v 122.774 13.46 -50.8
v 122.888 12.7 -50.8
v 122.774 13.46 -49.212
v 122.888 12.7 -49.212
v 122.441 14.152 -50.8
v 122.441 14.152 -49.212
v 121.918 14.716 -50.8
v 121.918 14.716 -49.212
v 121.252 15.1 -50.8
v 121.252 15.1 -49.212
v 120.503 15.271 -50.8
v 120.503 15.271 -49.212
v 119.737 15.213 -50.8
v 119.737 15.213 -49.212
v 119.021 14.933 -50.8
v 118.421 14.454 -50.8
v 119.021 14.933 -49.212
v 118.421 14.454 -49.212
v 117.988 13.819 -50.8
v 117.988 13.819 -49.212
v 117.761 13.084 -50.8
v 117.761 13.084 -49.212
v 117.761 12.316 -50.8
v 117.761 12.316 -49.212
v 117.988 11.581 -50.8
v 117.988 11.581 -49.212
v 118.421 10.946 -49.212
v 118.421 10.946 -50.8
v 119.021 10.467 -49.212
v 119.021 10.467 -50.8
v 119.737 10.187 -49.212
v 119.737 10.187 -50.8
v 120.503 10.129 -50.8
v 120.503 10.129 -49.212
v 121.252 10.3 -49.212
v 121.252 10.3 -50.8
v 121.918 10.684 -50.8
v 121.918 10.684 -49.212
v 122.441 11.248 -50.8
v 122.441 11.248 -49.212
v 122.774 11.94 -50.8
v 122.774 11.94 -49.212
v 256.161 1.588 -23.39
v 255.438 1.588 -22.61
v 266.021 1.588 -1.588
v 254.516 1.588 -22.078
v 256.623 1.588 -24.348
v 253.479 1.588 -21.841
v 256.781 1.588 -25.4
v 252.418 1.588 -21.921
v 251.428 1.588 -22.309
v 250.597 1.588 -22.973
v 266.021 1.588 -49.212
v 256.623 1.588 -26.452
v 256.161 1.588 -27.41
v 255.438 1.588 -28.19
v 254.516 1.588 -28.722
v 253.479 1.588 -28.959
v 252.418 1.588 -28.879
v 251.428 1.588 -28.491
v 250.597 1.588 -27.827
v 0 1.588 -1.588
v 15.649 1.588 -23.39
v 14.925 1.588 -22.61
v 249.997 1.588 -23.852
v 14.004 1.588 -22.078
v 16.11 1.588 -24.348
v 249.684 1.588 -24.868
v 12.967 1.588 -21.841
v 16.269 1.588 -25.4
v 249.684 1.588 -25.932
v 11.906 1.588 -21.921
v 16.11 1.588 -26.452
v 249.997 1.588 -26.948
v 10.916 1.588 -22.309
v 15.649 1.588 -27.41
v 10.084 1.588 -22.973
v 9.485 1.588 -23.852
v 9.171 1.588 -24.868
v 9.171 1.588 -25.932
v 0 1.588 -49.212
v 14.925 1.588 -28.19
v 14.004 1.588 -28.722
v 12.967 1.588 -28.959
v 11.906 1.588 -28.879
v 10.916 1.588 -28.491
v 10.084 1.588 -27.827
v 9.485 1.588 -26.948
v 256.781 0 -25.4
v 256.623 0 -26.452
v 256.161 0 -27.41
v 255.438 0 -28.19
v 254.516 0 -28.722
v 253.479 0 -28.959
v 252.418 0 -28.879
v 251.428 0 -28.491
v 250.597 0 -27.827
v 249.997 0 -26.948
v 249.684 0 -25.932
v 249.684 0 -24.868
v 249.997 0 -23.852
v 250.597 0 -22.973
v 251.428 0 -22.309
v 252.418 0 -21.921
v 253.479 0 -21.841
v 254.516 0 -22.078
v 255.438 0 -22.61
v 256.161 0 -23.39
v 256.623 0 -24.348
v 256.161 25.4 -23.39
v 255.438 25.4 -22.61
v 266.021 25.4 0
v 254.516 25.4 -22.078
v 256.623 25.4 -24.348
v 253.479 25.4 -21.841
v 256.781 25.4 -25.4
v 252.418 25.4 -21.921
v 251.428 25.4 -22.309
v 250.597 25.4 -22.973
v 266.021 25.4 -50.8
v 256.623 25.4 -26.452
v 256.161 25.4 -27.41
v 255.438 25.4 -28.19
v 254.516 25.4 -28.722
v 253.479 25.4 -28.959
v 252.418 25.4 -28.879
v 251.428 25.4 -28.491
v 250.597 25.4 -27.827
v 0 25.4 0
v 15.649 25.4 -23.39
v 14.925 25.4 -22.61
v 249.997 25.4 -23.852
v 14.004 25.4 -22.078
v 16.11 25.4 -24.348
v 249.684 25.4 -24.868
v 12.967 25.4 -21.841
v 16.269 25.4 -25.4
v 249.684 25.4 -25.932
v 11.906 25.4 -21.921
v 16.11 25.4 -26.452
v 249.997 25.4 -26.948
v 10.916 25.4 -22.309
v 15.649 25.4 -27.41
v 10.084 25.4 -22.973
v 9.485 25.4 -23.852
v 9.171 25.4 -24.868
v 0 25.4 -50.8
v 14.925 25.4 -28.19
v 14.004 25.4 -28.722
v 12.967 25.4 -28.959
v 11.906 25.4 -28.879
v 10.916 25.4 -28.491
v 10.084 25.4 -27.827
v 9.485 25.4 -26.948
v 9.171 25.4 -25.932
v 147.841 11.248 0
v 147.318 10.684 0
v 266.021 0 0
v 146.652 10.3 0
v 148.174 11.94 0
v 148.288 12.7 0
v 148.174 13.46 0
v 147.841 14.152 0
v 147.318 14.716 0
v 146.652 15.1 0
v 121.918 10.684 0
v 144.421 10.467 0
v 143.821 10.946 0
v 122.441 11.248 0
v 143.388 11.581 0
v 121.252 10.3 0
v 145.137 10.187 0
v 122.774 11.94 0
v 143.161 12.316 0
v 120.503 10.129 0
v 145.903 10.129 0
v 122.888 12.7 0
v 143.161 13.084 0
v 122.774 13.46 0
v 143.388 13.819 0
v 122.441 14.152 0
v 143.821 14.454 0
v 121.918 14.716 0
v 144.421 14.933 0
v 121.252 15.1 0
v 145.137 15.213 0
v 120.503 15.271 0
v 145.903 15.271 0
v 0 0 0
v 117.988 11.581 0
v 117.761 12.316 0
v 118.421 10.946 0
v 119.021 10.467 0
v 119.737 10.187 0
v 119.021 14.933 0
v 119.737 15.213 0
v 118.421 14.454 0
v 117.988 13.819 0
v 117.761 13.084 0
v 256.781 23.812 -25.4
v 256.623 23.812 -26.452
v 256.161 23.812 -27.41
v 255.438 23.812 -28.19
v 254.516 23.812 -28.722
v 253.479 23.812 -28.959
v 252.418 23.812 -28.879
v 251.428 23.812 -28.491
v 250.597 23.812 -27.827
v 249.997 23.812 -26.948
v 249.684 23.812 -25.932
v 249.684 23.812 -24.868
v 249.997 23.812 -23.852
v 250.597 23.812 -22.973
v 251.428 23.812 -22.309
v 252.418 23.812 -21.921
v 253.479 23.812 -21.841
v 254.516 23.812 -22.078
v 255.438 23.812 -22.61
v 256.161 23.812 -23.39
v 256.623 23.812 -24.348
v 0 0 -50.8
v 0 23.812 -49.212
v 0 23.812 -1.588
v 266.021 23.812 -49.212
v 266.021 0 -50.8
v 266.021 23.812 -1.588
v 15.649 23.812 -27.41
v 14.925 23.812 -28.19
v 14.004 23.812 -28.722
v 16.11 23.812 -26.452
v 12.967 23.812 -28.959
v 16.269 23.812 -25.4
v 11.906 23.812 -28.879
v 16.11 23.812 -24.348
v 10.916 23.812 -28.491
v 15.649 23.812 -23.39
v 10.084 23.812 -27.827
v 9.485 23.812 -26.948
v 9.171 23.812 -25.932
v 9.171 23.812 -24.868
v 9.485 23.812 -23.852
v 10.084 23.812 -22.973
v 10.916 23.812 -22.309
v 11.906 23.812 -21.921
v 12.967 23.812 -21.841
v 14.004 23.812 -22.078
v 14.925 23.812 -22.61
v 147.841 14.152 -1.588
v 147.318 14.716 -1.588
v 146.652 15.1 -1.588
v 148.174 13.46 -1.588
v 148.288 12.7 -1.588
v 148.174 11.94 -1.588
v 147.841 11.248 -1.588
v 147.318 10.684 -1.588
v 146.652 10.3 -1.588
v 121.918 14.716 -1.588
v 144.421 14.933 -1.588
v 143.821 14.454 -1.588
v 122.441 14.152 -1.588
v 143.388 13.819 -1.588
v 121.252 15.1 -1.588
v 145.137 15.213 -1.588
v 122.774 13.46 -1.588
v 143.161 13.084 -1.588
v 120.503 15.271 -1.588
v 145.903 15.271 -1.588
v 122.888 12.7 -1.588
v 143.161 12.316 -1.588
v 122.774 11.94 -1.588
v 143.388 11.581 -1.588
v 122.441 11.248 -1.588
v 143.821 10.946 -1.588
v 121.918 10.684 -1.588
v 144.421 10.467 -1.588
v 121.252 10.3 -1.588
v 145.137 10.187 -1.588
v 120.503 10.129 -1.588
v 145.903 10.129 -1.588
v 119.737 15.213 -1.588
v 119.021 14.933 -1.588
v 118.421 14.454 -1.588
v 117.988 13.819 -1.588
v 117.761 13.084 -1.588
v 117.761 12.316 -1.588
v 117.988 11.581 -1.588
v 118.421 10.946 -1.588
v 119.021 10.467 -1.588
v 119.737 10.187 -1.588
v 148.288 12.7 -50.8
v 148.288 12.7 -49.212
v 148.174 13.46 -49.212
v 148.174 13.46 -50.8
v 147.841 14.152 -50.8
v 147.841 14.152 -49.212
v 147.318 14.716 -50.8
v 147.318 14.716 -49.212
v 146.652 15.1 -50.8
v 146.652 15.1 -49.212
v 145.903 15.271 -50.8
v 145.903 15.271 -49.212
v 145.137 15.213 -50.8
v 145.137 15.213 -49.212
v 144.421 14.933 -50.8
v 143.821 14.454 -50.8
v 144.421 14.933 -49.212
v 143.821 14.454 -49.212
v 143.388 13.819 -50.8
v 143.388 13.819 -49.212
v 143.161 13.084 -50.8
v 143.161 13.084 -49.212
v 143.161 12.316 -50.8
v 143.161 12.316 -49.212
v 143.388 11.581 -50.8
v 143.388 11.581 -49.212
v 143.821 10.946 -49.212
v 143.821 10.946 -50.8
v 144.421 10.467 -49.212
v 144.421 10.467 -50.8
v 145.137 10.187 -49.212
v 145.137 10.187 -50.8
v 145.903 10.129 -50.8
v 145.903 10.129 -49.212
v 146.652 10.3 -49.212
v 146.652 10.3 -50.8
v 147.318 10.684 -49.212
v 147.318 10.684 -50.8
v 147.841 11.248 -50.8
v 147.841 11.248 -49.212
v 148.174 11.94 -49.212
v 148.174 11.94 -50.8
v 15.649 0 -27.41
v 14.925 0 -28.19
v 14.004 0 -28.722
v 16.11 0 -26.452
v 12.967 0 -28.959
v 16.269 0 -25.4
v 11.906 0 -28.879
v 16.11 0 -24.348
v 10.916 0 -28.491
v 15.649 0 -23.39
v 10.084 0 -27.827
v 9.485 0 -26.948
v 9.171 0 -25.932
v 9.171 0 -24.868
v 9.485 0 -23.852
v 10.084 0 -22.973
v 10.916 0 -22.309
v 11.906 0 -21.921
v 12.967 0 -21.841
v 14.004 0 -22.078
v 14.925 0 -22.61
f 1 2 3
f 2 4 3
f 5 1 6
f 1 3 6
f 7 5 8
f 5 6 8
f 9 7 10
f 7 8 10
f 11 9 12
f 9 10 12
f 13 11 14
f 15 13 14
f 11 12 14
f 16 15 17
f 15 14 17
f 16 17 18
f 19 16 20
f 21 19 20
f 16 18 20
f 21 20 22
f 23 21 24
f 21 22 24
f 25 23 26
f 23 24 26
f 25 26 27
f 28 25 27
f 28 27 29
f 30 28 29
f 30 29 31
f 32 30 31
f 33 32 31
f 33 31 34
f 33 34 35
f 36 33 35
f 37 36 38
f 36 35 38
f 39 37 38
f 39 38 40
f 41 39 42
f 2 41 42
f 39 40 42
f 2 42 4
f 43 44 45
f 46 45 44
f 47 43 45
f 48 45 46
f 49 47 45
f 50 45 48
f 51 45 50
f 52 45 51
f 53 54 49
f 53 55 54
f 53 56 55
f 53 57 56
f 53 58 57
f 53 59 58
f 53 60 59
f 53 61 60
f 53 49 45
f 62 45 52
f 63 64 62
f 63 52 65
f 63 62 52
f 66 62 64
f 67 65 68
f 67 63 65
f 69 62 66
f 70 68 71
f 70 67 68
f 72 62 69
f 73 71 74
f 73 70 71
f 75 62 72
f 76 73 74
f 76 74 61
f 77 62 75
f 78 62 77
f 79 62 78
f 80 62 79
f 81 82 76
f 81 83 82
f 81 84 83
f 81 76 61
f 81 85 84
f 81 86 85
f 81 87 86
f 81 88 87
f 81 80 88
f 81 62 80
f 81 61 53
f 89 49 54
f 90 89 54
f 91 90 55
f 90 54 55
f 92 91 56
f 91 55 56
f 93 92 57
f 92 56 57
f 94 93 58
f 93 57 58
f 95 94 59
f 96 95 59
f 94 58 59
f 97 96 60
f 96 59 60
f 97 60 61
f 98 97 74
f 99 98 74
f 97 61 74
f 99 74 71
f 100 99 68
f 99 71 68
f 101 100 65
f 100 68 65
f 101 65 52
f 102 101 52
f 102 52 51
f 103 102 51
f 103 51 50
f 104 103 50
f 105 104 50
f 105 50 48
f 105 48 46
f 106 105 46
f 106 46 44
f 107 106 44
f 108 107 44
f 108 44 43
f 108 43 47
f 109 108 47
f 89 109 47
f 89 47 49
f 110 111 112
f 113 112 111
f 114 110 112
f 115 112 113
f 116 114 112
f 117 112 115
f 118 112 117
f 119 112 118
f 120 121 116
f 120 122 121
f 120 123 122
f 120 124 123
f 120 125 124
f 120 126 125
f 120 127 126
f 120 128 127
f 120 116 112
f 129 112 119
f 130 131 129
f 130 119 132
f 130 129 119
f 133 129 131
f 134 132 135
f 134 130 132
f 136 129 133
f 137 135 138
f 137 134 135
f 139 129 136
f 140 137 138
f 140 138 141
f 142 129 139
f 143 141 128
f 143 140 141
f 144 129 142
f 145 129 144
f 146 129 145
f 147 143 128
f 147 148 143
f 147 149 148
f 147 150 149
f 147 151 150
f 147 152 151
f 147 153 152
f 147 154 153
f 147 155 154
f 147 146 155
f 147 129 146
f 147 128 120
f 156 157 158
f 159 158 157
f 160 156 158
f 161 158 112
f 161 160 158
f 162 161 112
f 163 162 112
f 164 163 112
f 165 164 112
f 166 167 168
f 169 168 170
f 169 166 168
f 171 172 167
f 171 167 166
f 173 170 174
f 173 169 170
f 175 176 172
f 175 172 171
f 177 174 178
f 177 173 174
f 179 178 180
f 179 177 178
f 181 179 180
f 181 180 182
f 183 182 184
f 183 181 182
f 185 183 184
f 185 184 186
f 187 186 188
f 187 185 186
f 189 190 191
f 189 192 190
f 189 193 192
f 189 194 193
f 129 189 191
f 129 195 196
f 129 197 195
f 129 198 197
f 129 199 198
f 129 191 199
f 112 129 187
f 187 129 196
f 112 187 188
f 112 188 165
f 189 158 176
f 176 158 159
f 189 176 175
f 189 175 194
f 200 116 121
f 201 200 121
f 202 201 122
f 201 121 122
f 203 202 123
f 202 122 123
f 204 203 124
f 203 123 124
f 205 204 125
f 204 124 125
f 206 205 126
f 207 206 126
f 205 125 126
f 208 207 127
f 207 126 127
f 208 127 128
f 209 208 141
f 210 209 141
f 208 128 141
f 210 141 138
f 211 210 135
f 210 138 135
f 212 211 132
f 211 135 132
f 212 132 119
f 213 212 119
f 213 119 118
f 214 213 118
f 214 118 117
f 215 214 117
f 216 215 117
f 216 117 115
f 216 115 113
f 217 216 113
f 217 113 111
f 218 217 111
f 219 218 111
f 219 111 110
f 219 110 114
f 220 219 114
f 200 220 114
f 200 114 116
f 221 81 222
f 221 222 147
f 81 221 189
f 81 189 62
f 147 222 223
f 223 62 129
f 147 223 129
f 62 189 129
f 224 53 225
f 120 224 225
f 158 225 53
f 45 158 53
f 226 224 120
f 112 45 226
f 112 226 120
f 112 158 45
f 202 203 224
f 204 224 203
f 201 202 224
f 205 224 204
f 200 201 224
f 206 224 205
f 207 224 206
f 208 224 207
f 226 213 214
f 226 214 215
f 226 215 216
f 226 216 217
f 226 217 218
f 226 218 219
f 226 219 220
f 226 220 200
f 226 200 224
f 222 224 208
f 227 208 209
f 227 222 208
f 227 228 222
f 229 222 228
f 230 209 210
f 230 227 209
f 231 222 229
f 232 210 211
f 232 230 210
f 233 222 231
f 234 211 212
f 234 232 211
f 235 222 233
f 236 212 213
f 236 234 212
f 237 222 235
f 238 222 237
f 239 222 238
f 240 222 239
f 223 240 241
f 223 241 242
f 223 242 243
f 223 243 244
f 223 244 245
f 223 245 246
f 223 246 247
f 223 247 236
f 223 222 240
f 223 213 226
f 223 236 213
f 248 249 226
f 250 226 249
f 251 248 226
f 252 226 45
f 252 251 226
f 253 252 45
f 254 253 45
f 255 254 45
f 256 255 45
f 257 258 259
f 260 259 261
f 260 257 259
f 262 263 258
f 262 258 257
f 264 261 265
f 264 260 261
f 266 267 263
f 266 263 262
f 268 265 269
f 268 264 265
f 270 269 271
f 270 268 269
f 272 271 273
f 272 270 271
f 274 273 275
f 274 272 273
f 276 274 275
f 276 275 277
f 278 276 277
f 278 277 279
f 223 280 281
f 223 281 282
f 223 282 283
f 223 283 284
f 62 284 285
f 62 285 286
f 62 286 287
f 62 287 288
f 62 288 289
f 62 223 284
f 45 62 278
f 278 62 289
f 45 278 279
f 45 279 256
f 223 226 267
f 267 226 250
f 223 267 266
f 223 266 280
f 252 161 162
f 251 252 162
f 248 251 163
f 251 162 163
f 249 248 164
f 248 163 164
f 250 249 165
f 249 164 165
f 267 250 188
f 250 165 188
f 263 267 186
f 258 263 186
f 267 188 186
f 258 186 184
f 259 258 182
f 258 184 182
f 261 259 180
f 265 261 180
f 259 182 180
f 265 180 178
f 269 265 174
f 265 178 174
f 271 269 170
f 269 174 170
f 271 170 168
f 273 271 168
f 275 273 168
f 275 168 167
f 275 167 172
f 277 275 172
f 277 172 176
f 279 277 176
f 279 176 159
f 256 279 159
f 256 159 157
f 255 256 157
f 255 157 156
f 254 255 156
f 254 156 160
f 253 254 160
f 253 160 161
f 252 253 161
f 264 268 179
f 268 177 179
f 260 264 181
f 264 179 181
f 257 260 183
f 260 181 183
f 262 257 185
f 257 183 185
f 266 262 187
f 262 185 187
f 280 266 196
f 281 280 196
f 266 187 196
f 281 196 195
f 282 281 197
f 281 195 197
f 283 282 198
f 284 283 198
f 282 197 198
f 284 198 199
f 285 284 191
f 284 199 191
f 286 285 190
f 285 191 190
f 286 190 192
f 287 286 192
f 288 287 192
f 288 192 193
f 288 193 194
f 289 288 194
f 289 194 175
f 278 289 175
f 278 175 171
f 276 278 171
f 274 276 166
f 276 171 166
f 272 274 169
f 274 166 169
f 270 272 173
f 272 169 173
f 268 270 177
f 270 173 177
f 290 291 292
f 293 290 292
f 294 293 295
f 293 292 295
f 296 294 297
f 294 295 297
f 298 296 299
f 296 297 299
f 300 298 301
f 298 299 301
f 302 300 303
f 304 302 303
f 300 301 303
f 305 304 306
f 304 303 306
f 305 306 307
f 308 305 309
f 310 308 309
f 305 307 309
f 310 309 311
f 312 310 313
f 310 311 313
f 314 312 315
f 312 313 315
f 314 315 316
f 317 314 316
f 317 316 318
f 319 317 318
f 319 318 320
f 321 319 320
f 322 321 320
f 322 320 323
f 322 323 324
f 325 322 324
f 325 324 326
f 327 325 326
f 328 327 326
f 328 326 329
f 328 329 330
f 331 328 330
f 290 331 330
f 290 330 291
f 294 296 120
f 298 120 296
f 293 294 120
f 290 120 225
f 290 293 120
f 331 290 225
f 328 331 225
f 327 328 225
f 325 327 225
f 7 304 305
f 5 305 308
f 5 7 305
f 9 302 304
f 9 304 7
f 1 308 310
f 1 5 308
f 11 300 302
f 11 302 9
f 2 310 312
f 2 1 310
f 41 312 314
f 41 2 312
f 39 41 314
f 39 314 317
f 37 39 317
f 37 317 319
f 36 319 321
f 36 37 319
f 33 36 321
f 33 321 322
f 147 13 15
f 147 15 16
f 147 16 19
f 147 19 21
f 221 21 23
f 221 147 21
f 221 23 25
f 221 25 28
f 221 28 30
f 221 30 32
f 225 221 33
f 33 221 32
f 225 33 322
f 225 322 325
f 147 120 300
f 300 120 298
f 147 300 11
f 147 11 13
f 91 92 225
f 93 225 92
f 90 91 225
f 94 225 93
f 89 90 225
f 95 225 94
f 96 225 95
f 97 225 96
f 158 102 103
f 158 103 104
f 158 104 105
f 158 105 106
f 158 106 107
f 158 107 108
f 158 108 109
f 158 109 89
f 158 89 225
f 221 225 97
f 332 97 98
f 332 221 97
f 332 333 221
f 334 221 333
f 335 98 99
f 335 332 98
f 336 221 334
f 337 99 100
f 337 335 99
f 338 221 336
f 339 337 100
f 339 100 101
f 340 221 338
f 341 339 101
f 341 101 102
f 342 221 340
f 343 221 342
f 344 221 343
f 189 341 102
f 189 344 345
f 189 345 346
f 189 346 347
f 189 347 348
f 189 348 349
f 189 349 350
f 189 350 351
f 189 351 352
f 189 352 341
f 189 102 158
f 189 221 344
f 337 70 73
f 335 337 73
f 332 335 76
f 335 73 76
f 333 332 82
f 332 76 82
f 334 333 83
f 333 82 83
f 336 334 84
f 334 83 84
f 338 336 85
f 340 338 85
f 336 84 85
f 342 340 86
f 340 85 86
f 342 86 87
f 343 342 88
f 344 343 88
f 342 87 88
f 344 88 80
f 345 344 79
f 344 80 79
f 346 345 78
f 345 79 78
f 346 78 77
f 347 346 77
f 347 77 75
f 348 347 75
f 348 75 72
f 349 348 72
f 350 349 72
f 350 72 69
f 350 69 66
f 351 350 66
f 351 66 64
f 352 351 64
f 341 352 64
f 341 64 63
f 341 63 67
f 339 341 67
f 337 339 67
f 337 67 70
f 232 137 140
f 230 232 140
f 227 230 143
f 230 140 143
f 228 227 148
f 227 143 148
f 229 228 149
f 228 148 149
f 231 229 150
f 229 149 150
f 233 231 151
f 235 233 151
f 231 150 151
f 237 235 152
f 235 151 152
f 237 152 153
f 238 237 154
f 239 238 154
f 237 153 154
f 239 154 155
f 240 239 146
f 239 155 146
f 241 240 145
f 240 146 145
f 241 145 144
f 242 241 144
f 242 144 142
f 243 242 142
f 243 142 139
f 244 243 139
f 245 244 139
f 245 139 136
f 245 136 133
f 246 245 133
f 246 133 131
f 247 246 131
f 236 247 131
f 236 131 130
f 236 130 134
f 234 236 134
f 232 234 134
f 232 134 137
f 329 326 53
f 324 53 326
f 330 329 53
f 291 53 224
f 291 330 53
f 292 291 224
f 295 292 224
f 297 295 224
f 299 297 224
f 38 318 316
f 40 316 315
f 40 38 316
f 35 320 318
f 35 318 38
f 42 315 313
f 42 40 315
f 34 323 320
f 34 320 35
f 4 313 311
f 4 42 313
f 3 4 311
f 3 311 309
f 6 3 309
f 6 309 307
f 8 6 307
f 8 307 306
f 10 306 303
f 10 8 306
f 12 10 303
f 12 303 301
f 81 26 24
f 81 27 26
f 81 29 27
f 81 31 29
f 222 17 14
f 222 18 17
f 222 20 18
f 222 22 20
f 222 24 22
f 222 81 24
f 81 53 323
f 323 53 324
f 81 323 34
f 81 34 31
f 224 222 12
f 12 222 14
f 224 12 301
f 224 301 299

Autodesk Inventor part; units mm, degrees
ref_plane "YZ Plane" through (0, 0, 0) normal (1, 0, 0) x (0, 1, 0)
ref_plane "XZ Plane" through (0, 0, 0) normal (0, 1, 0) x (-1, 0, 0)
ref_plane "XY Plane" through (0, 0, 0) normal (0, 0, 1) x (1, 0, 0)
sketch "Sketch1" plane through (0, 0, 0) normal (1, 0, 0) x (0, 1, 0)
  line L0 (0, 0) -> (25.4, 0)
  line L1 (25.4, 0) -> (25.4, -50.8)
  line L2 (25.4, -50.8) -> (0, -50.8)
  line L3 (0, -50.8) -> (0, 0)
  line L4 (23.8125, -1.5875) -> (1.5875, -1.5875)
  line L5 (1.5875, -1.5875) -> (1.5875, -49.2125)
  line L6 (1.5875, -49.2125) -> (23.8125, -49.2125)
  line L7 (23.8125, -49.2125) -> (23.8125, -1.5875)
  dimension "d0" = 25.4
  dimension "d1" = 50.8
  dimension "d2" = 1.5875
extrude "Extrusion1" add sketch "Sketch1" along normal blind 266.0208
sketch "Sketch2" plane through (0, 25.4, 0) normal (0, 1, 0) x (1, 0, 0)
  line L0 (0, 50.8) -> (0, 0) projected
  line L1 (0, 0) -> (266.0208, 0) projected
  line L2 (266.0208, 50.8) -> (266.0208, 0) projected
  line L3 (0, 50.8) -> (266.0208, 50.8) projected
  circle A0 centre (12.7, 25.4) radius 3.5687
  circle A1 centre (253.2126, 25.4) radius 3.5687
  point P0 (0, 0)
  dimension "d5" = 7.1374
  dimension "d6" = 12.7
  dimension "d7" = 7.1374
  dimension "d9" = 25.4
  dimension "d10" = 25.4
  dimension "d29" = 240.5126
extrude "Extrusion2" cut sketch "Sketch2" against normal blind 25.4 contours A0 | A1
sketch "Sketch4" plane through (0, 0, 0) normal (0, 0, 1) x (1, 0, 0)
  line L0 (0, 25.4) -> (0, 0) projected
  line L1 (0, 0) -> (266.0208, 0) projected
  line L2 (266.0208, 25.4) -> (266.0208, 0) projected
  line L3 (0, 25.4) -> (266.0208, 25.4) projected
  line L4 (133.0104, 25.4) -> (133.0104, 0) construction
  circle A0 centre (120.3104, 12.7) radius 2.5781
  circle A1 centre (145.7104, 12.7) radius 2.5781
  dimension "d21" = 5.1562
  dimension "d22" = 5.1562
  dimension "d23" = 12.7
  dimension "d24" = 25.4
  dimension "d27" = 12.7
  dimension "d28" = 12.7
extrude "Extrusion4" cut sketch "Sketch4" against normal through all contours A0 | A1
properties part number "2inTubeBase"
